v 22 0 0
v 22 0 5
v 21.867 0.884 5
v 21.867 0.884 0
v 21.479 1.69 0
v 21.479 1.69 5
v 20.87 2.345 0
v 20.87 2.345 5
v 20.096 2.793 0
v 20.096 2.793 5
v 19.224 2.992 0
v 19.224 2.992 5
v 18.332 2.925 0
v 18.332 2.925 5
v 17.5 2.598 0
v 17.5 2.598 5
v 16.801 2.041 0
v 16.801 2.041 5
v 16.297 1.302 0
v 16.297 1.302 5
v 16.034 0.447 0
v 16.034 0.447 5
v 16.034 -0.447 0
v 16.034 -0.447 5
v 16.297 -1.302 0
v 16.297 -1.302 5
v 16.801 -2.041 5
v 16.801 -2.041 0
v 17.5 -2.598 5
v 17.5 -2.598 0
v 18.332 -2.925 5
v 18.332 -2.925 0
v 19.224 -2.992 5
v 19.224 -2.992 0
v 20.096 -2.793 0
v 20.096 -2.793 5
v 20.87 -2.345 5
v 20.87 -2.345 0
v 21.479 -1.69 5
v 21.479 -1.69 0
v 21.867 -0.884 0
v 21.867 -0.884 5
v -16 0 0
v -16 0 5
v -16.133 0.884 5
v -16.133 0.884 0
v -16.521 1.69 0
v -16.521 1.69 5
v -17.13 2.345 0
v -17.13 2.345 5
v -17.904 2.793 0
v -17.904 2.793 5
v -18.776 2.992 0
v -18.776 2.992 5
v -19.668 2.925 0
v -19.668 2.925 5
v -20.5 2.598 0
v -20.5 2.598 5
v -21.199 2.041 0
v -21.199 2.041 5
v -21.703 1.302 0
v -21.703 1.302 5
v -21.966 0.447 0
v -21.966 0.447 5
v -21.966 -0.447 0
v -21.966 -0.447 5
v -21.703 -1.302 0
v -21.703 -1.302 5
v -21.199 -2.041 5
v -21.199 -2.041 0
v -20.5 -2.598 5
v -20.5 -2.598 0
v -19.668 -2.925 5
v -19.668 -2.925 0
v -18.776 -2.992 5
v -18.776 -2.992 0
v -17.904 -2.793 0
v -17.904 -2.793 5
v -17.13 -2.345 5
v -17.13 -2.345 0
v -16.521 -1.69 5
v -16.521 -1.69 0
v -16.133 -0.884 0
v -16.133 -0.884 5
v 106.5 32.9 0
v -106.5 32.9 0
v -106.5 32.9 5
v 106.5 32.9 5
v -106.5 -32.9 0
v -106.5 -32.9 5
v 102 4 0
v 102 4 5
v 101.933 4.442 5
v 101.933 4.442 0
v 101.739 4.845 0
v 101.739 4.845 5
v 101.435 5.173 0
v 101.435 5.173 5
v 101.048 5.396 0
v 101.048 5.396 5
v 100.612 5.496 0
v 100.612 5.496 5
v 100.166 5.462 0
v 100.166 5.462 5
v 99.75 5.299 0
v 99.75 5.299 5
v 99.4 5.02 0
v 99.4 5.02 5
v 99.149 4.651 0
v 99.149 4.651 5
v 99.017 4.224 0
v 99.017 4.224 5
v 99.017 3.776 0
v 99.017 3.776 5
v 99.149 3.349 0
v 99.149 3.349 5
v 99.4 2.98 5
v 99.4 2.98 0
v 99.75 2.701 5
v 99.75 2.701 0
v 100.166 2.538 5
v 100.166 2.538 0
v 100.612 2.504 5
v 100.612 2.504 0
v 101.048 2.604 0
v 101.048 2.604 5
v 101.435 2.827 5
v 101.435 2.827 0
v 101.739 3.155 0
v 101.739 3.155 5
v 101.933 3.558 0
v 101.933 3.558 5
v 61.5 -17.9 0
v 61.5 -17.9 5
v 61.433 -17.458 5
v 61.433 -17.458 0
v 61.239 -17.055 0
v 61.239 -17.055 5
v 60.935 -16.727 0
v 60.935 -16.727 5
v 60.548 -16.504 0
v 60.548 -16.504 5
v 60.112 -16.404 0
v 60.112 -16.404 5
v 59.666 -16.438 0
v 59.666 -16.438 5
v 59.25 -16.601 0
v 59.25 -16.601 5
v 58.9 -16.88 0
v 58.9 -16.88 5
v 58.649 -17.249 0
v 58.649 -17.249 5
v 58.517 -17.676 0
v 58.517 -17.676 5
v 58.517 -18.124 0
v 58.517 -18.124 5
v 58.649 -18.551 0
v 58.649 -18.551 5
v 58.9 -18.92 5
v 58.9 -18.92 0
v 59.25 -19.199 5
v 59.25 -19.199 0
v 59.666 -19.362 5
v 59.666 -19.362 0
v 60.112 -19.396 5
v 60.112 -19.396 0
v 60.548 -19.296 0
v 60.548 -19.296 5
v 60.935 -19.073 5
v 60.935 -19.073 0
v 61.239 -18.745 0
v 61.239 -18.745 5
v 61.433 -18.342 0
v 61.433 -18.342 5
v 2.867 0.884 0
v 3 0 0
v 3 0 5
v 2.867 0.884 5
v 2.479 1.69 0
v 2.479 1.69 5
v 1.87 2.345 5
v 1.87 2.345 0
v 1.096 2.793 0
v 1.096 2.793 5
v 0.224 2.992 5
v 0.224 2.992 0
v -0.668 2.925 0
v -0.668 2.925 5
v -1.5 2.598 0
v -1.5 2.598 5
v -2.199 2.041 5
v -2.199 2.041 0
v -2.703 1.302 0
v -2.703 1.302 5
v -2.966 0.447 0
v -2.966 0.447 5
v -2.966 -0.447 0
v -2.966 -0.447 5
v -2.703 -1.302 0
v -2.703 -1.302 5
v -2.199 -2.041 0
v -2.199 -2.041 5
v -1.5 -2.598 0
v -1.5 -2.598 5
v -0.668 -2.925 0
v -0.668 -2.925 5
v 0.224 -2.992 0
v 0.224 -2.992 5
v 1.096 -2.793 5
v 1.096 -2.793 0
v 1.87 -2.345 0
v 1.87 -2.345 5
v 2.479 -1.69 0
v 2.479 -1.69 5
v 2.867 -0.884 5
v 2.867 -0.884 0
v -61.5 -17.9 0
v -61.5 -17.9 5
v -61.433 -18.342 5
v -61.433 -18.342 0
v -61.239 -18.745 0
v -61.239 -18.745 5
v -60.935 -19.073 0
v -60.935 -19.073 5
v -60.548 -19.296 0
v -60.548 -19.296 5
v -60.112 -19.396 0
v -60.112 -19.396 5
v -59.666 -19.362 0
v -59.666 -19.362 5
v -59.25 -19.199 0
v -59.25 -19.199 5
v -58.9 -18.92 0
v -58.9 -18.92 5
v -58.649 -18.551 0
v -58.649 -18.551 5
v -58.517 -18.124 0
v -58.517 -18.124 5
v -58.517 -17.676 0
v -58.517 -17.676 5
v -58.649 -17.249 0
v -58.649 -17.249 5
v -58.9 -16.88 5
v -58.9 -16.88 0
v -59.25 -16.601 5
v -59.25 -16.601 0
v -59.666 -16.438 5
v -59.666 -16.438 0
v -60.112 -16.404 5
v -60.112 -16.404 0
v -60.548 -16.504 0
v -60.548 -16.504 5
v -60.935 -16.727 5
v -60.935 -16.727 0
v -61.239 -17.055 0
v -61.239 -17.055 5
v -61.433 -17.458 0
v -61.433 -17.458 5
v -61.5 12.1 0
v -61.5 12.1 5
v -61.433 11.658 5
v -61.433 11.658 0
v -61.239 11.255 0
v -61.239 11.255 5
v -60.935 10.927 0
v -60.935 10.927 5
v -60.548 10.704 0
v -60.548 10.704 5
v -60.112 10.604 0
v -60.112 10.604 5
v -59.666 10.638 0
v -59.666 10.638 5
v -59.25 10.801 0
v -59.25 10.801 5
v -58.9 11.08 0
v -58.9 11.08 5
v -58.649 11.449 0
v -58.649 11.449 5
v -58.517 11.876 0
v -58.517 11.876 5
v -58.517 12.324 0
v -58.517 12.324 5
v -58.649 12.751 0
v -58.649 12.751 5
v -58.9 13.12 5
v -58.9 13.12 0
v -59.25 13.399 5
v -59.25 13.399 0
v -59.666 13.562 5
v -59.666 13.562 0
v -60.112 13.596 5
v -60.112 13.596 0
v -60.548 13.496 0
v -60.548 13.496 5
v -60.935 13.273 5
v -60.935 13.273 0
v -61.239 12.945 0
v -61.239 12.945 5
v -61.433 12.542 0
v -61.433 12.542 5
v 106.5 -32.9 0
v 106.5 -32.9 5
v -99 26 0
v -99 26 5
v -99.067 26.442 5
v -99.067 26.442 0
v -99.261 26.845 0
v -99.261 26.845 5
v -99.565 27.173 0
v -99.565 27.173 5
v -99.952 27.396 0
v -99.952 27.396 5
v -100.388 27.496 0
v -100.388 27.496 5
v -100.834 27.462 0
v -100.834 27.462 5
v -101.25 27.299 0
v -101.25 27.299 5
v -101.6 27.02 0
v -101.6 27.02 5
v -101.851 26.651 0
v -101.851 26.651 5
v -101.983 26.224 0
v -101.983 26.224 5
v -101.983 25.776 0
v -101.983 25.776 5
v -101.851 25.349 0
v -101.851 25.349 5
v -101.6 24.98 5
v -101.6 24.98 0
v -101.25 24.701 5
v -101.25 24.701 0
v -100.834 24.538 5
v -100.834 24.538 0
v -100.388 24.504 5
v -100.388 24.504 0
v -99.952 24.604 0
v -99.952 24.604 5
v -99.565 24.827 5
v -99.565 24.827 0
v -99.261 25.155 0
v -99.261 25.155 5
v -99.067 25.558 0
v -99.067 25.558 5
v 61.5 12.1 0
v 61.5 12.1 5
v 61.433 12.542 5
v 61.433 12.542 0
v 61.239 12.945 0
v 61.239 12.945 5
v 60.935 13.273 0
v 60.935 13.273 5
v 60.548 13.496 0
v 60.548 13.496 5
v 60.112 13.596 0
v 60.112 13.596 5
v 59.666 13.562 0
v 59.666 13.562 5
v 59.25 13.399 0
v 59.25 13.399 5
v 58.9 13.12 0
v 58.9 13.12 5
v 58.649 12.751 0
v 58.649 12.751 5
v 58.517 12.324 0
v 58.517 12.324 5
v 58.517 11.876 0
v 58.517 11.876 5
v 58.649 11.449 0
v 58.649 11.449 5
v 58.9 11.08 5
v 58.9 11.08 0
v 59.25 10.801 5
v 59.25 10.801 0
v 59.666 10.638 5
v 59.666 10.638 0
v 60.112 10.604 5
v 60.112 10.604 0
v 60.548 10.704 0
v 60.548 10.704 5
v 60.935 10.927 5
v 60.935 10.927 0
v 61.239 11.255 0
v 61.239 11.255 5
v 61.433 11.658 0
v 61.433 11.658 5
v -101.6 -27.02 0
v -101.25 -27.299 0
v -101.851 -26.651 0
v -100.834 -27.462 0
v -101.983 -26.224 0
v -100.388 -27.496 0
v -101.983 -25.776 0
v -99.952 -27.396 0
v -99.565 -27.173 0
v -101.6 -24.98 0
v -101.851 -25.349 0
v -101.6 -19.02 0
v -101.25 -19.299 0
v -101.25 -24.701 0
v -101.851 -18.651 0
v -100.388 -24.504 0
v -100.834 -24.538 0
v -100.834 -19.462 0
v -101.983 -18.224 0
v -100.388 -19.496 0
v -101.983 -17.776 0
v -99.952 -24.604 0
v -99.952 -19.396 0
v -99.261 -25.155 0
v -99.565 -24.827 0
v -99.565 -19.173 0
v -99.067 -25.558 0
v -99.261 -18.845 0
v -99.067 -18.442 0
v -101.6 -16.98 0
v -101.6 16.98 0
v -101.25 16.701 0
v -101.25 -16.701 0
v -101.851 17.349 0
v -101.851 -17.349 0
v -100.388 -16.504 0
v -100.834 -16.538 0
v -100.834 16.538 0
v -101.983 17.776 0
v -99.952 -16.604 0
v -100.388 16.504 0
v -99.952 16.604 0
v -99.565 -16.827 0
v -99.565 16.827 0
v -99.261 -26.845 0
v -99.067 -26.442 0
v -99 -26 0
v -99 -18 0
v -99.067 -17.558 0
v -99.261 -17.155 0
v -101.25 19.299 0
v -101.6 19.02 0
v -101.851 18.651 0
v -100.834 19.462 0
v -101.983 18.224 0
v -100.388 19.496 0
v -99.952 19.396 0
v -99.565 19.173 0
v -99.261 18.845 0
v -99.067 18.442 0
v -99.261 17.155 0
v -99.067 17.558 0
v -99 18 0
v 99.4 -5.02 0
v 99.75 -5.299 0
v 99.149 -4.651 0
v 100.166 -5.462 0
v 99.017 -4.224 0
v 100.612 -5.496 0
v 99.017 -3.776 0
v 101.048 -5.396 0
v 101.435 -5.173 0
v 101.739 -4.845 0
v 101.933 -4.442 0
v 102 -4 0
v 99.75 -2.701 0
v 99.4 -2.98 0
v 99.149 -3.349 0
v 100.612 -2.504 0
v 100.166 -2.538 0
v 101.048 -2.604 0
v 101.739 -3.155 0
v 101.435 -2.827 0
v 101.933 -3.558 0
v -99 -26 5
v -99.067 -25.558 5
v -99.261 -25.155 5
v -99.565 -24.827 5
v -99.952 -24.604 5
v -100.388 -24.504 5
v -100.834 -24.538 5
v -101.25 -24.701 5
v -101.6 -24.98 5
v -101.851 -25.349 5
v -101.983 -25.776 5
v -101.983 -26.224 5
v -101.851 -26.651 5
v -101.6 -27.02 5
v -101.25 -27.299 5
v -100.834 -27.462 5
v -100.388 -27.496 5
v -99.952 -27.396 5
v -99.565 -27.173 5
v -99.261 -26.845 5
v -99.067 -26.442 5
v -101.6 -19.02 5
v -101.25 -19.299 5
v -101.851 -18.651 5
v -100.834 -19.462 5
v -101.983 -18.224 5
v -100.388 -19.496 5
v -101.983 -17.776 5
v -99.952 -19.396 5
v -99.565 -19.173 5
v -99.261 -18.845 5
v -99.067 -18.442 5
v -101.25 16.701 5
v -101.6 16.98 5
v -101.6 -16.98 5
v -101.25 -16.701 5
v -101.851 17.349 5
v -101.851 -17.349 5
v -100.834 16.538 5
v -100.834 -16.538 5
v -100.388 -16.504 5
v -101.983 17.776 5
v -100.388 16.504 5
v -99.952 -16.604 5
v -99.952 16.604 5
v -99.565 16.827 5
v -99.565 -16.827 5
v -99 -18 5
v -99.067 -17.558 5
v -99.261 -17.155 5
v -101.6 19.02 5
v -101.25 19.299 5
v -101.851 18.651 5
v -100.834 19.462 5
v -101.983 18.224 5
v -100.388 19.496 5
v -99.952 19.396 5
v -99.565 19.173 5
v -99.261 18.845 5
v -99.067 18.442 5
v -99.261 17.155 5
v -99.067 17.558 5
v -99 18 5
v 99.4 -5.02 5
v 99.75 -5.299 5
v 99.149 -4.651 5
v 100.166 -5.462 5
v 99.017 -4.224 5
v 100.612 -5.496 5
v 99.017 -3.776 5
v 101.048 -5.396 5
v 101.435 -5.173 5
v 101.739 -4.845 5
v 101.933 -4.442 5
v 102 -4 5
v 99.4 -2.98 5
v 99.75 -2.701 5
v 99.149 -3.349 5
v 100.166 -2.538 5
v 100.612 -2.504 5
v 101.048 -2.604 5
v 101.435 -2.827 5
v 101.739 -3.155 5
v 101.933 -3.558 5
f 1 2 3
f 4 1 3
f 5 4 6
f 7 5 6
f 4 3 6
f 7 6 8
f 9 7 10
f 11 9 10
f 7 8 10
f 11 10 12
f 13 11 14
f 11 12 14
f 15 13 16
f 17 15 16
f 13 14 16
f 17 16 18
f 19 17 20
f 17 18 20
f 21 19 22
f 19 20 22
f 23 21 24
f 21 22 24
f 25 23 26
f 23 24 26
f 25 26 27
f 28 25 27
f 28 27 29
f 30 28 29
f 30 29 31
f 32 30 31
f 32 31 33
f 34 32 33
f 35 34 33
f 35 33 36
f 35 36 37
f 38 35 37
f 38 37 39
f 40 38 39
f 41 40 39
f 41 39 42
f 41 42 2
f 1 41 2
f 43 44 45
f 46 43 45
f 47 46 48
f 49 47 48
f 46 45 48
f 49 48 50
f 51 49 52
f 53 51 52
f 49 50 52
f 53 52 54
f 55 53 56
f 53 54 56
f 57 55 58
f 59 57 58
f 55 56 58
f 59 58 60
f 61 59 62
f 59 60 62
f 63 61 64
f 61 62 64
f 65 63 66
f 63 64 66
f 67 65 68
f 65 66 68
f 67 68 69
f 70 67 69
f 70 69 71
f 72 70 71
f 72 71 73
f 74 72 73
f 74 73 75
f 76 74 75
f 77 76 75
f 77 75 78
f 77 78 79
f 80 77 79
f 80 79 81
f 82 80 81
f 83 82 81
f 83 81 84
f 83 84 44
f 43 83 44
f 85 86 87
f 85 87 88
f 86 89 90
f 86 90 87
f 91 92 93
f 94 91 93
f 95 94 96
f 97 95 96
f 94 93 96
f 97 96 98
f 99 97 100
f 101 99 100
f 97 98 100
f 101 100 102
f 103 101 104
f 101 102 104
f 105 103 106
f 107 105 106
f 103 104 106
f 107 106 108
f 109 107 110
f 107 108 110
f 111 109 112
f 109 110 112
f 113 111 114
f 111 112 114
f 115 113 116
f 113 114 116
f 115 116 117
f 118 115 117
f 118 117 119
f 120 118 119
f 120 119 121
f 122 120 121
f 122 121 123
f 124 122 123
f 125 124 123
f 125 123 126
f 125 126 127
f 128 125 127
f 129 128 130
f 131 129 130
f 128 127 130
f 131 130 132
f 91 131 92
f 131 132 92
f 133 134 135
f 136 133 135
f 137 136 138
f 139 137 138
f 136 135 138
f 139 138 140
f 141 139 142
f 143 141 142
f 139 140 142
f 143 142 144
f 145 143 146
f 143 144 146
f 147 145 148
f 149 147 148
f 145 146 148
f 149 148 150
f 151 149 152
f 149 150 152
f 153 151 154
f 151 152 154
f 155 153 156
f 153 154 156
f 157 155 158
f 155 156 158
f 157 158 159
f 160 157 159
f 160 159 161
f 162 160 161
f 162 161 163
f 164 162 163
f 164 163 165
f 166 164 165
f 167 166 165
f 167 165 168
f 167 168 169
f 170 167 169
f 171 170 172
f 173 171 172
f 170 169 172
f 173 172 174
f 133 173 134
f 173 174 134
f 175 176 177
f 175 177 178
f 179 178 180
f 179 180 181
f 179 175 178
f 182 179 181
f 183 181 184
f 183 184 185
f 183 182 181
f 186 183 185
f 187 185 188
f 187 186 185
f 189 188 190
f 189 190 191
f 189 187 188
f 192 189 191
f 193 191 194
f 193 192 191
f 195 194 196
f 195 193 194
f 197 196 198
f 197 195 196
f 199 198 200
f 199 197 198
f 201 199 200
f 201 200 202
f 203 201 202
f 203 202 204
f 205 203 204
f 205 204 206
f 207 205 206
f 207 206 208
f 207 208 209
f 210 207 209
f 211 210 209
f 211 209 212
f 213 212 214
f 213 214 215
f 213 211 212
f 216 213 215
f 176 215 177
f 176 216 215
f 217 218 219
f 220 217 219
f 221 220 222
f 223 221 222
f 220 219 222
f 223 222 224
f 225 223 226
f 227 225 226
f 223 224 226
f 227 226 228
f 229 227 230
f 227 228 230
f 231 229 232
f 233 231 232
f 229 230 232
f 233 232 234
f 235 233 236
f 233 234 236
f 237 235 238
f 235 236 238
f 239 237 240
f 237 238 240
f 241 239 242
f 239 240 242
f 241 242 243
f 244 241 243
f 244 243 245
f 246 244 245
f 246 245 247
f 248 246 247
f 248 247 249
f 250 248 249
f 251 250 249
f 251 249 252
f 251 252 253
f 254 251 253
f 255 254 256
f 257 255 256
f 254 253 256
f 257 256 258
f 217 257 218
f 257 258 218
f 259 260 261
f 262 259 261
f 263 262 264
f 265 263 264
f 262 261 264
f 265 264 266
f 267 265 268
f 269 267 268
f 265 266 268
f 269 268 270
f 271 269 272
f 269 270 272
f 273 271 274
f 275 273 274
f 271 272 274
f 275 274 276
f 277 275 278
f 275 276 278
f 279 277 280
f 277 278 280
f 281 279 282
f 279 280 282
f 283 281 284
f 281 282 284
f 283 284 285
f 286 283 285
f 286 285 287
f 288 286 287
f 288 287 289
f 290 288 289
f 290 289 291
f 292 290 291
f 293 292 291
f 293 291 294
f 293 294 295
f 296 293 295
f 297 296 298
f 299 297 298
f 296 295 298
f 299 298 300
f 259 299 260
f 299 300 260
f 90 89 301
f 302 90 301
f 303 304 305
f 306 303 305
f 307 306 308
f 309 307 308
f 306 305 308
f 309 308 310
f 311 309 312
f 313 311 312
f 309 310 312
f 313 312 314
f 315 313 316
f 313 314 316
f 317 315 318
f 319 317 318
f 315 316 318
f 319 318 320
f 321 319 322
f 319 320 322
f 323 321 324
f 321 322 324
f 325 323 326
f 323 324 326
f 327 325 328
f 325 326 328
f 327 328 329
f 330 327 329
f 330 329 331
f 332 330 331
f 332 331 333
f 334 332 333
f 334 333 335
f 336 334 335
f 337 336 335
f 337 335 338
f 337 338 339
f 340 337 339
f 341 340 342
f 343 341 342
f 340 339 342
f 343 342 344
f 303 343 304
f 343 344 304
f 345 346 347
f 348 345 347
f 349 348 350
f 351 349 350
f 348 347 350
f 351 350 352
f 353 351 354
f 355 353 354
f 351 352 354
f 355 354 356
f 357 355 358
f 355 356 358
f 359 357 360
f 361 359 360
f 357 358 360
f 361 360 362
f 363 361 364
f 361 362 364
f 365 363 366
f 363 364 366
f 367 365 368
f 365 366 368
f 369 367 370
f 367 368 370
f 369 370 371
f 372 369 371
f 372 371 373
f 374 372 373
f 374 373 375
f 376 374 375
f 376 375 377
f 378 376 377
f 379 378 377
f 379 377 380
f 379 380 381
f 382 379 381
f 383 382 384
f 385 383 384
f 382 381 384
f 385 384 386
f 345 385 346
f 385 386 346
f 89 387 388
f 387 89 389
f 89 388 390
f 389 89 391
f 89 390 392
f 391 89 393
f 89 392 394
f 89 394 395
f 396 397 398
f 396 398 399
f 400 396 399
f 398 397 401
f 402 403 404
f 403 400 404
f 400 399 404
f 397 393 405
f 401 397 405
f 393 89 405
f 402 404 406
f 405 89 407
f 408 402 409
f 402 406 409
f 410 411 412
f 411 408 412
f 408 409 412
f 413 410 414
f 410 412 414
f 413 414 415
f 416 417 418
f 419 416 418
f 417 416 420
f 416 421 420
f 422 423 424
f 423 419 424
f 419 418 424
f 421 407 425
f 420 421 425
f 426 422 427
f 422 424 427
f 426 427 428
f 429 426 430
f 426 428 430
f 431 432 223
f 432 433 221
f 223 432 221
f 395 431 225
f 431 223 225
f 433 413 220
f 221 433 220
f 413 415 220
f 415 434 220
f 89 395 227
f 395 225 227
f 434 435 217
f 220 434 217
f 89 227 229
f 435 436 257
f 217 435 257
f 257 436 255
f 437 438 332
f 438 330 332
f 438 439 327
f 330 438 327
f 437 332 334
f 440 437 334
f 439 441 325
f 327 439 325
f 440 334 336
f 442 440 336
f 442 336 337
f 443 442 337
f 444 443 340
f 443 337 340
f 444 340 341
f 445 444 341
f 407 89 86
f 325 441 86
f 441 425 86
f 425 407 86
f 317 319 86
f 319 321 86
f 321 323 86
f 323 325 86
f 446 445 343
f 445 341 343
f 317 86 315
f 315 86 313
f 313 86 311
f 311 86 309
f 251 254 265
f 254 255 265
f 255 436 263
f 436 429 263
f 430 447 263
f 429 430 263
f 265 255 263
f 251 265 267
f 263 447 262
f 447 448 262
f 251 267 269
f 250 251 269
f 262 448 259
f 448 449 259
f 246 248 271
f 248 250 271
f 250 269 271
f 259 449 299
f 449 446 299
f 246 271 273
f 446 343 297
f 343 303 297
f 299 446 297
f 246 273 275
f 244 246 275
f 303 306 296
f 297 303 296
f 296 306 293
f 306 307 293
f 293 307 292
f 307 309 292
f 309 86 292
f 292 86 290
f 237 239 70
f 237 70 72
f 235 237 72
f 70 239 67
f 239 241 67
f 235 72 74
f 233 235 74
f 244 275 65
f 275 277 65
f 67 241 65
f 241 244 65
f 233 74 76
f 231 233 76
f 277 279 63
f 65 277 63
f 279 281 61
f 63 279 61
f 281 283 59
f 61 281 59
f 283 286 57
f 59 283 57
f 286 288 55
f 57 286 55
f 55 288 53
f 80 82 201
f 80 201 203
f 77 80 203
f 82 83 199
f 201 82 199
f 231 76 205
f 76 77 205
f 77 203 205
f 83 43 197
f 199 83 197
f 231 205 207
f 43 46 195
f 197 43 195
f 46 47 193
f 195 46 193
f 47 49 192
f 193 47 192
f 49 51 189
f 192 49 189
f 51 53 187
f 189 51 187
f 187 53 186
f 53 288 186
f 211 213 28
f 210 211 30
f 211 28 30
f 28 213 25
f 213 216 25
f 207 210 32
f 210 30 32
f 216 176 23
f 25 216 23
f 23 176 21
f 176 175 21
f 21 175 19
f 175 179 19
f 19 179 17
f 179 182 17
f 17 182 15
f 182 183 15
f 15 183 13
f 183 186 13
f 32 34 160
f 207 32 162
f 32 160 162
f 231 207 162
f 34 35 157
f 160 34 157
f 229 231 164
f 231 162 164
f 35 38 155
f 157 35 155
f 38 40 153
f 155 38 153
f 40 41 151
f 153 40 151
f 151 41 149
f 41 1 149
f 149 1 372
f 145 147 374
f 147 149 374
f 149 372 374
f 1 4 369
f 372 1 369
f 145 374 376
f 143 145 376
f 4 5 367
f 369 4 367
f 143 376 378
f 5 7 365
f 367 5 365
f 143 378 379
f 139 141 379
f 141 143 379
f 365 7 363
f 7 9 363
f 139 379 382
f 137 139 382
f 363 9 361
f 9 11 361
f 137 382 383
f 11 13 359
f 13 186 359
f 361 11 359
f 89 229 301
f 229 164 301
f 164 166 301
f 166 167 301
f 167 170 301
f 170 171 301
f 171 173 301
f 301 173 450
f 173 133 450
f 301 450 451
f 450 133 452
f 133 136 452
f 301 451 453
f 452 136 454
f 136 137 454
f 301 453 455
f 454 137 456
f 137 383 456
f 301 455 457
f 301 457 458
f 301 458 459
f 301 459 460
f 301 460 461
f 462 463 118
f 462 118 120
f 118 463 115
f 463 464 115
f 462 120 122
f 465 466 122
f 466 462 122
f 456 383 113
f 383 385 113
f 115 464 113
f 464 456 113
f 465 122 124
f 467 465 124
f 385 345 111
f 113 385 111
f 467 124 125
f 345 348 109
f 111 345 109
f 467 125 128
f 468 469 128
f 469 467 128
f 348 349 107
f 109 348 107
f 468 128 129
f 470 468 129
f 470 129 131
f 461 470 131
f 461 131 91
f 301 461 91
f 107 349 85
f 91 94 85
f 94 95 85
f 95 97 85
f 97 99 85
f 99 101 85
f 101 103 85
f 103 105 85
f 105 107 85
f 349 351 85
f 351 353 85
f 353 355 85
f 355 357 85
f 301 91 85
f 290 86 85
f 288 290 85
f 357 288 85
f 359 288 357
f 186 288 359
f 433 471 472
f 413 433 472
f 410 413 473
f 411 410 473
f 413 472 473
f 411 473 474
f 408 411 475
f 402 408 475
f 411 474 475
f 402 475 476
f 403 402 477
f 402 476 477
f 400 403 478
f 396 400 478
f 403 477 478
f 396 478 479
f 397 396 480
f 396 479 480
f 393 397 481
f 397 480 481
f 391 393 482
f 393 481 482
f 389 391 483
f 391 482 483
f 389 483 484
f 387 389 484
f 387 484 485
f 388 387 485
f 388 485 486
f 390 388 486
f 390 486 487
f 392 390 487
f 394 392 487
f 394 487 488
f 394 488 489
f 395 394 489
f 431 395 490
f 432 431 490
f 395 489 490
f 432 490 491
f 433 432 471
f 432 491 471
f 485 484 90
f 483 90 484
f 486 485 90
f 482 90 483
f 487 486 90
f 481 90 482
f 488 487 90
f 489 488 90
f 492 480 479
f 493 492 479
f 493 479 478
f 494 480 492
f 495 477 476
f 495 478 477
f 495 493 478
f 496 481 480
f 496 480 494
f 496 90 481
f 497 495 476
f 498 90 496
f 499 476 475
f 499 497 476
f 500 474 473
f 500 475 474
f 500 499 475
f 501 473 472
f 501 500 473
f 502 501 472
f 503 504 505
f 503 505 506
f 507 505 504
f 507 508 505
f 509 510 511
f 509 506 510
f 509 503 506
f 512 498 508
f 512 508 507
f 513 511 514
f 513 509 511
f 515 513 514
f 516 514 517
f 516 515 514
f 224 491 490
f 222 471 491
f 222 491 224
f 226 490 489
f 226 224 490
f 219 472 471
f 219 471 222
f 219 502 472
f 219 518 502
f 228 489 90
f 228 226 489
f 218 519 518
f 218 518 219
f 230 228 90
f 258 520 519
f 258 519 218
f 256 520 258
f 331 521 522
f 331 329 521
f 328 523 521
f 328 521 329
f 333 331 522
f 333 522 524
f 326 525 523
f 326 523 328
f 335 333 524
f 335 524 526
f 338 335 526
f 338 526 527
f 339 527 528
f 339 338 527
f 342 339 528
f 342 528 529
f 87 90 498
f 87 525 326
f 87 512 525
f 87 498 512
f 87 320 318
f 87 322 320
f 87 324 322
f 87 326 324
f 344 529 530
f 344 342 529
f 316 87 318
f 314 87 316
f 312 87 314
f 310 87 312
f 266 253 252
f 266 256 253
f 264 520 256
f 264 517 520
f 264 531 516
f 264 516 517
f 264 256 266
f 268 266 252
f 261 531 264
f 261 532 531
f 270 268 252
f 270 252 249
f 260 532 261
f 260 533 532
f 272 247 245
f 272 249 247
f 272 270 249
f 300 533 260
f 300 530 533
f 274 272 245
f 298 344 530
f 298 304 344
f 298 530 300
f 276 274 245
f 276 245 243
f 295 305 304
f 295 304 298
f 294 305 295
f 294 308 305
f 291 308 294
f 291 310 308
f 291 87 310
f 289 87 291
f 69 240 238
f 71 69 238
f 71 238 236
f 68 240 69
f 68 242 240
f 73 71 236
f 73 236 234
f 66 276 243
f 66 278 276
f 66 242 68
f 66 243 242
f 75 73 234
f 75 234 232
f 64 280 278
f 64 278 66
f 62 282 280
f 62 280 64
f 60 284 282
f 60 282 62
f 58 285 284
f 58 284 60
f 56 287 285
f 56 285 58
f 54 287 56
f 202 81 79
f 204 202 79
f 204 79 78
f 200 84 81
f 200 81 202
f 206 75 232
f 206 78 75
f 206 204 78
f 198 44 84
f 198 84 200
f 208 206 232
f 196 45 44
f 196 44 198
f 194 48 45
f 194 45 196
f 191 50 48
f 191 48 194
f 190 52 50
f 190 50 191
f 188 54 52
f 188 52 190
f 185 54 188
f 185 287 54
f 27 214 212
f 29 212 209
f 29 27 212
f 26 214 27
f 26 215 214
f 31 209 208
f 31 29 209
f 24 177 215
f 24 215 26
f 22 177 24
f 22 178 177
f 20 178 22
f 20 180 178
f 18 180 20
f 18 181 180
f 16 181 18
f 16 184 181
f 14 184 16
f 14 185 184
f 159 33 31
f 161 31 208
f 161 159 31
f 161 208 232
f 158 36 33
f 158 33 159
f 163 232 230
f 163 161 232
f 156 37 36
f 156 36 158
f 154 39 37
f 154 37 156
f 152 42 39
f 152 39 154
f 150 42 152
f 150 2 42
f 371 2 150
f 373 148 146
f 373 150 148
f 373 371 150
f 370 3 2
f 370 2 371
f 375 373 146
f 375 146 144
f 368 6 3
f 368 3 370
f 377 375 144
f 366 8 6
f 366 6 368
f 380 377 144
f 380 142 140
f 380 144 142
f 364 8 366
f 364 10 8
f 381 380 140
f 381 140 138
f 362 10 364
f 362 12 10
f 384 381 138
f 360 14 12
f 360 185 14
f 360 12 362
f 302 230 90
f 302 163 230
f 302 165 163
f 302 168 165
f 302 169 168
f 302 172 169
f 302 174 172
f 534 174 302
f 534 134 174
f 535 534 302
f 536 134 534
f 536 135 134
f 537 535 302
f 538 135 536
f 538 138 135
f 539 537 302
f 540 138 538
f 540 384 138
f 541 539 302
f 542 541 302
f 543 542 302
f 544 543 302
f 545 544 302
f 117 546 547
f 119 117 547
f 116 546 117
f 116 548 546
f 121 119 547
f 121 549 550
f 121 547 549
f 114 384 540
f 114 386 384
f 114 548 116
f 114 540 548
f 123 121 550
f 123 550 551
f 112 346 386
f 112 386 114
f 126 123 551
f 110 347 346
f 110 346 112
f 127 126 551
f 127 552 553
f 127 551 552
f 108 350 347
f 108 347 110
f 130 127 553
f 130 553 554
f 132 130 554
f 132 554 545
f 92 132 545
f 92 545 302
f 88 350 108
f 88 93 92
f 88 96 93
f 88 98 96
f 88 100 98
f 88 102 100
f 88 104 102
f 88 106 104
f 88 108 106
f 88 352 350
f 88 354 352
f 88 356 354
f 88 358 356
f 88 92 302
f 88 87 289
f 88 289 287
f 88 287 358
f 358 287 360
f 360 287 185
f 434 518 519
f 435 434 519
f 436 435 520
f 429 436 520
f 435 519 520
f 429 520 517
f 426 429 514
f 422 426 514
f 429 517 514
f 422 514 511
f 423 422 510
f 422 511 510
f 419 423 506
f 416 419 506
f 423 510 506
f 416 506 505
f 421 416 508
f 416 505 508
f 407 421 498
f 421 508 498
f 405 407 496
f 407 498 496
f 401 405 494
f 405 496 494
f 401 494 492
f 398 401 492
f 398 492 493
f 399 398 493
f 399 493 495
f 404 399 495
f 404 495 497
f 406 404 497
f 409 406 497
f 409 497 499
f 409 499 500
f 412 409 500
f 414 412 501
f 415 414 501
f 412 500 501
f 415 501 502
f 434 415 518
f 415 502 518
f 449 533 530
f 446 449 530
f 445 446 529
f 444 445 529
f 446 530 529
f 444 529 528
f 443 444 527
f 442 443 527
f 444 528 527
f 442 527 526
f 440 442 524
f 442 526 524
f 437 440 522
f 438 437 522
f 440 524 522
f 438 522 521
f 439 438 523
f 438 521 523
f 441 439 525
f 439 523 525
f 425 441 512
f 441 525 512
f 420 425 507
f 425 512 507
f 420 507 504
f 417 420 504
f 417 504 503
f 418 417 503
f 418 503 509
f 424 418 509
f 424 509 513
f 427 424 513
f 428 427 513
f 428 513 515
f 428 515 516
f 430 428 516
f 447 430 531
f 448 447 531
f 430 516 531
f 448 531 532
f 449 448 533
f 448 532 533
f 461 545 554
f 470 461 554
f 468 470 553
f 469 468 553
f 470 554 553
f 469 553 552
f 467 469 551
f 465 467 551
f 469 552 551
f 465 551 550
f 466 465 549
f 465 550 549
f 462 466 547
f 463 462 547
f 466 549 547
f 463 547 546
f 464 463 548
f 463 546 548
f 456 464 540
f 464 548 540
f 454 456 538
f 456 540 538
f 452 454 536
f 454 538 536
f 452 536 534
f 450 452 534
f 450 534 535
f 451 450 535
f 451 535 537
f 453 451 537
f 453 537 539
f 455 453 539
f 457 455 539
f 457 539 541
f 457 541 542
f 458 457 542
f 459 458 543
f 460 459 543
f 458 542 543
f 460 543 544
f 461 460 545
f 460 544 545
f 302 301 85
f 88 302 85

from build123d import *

# Parameters (mm, degrees)
SKETCH_3_W          = 213
SKETCH_3_H          = 65.8
SKETCH_3_R          = 3
EXTRUDE_2_DEPTH     = 5
SKETCH_4_R          = 1.5
CUT_EXTRUDE_1_DEPTH = 5
SKETCH_5_R          = 1.5
CUT_EXTRUDE_2_DEPTH = 5
SKETCH_6_R          = 3
CUT_EXTRUDE_3_DEPTH = 10


with BuildPart() as part:
    # 草图3 → 凸台-拉伸2 (new body)
    with BuildSketch(Plane.XY):
        Rectangle(SKETCH_3_W, SKETCH_3_H)
        Circle(SKETCH_3_R, mode=Mode.SUBTRACT)
    extrude(amount=EXTRUDE_2_DEPTH)

    # 草图4 → 切除-拉伸1 (cut)
    with BuildSketch(Plane.XY.offset(5)):
        with Locations((60, 12.1)):
            Circle(SKETCH_4_R)
        with Locations((60, -17.9)):
            Circle(SKETCH_4_R)
        with Locations((-60, -17.9)):
            Circle(SKETCH_4_R)
        with Locations((-60, 12.1)):
            Circle(SKETCH_4_R)
    extrude(amount=-CUT_EXTRUDE_1_DEPTH, mode=Mode.SUBTRACT)

    # 草图5 → 切除-拉伸2 (cut)
    with BuildSketch(Plane.XY.offset(5)):
        with Locations((-100.5, 26)):
            Circle(SKETCH_5_R)
        with Locations((-100.5, 18)):
            Circle(SKETCH_5_R)
        with Locations((-100.5, -18)):
            Circle(SKETCH_5_R)
        with Locations((-100.5, -26)):
            Circle(SKETCH_5_R)
        with Locations((100.5, -4)):
            Circle(SKETCH_5_R)
        with Locations((100.5, 4)):
            Circle(SKETCH_5_R)
    extrude(amount=-CUT_EXTRUDE_2_DEPTH, mode=Mode.SUBTRACT)

    # 草图6 → 切除-拉伸3 (cut)
    with BuildSketch(Plane.XY.offset(5)):
        with Locations((19, 0)):
            Circle(SKETCH_6_R)
        with Locations((-19, 0)):
            Circle(SKETCH_6_R)
    extrude(amount=-CUT_EXTRUDE_3_DEPTH, mode=Mode.SUBTRACT)


solid = part.part
